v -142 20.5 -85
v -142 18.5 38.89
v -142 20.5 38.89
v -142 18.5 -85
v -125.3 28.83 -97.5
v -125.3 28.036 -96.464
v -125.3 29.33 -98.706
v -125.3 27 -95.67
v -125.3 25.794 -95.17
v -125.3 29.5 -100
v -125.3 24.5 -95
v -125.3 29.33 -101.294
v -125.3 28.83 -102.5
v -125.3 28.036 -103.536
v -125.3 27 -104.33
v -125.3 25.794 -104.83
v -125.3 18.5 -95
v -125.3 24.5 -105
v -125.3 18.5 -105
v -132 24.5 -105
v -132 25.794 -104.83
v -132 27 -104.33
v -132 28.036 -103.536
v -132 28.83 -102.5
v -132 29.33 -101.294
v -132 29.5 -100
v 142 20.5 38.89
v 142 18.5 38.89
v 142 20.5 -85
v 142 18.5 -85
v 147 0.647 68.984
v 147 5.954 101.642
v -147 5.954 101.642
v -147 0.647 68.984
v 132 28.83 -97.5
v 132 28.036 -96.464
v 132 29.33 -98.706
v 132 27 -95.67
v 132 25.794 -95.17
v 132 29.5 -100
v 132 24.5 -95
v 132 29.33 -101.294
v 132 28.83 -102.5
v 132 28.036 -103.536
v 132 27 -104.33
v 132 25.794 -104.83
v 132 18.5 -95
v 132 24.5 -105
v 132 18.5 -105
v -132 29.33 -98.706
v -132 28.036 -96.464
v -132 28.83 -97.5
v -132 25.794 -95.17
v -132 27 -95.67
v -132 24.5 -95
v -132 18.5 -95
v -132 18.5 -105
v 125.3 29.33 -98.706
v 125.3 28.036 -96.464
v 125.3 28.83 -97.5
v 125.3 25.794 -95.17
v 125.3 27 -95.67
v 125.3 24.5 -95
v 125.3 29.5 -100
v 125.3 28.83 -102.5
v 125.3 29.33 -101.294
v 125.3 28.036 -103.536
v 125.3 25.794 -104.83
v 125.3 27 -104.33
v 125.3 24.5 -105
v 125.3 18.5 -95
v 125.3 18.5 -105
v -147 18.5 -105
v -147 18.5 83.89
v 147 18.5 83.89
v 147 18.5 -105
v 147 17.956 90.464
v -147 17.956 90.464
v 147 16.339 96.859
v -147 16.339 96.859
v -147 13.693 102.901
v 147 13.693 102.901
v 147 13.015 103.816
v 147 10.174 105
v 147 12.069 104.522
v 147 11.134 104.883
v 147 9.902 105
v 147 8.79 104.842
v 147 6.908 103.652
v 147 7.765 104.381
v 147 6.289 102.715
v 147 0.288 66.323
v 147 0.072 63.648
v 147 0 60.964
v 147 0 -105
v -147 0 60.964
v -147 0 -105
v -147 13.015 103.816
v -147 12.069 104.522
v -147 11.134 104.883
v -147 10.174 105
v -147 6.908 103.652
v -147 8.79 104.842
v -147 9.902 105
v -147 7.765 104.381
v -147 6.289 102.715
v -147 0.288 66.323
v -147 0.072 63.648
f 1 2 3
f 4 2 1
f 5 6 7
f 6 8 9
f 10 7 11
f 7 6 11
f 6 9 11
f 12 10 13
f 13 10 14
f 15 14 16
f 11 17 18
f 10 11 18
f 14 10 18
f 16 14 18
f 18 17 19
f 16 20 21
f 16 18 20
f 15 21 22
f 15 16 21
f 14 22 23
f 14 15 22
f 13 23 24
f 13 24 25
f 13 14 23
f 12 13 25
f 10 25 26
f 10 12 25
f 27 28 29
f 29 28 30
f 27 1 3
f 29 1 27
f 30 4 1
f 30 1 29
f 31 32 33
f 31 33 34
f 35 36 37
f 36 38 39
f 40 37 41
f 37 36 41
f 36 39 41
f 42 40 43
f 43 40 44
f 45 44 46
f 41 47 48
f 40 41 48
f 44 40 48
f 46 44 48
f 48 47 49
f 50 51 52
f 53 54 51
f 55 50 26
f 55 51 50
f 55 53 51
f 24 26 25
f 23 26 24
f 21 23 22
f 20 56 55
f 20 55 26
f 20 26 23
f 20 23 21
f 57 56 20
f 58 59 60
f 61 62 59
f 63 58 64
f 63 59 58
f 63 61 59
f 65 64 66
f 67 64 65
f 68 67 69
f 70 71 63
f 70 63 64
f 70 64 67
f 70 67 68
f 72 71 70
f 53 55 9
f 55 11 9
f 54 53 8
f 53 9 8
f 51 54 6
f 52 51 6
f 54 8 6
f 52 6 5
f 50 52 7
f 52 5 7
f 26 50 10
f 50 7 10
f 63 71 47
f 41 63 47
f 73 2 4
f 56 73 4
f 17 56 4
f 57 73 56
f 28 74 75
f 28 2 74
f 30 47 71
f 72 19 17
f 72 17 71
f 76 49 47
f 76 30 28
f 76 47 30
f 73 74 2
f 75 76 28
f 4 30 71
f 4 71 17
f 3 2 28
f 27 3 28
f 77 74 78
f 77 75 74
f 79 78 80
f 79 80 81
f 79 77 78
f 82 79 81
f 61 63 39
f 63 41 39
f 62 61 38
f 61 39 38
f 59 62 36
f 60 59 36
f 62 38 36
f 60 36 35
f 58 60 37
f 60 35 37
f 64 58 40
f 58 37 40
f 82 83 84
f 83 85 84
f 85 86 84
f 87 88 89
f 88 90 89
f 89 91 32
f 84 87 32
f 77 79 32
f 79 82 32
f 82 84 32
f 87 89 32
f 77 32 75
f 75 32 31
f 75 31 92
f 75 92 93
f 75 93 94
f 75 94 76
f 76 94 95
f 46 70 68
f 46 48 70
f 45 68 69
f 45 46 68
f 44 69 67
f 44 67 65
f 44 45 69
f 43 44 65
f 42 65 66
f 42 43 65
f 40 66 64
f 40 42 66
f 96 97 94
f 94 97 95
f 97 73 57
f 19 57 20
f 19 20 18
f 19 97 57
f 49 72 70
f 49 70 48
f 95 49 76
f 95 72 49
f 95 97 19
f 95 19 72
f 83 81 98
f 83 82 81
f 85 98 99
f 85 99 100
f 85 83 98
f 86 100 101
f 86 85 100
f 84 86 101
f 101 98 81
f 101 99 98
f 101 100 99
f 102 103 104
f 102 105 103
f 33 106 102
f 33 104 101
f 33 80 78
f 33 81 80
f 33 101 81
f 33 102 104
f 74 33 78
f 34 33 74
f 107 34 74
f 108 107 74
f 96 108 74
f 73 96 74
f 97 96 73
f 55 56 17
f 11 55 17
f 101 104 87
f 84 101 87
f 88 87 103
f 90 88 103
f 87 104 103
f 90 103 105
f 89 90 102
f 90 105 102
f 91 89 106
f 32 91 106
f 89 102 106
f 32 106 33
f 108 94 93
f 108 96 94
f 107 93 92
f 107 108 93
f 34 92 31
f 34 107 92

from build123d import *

# Parameters (mm, degrees)
SKETCH1_W           = 294
SKETCH1_H           = 210
BOSS_EXTRUDE1_DEPTH = 18.5
CUT_EXTRUDE1_DEPTH  = 300
CHAMFER1_SIZE       = 6
CHAMFER1_SIZE2      = 10.392304845
FILLET1_R           = 40
FILLET2_R           = 4
FILLET3_R           = 50
SKETCH3_W           = 6.7
SKETCH3_H           = 10
BOSS_EXTRUDE2_DEPTH = 11
FILLET4_R           = 5
SKETCH4_W           = 284
SKETCH4_H           = 123.889727457
BOSS_EXTRUDE3_DEPTH = 2


with BuildPart() as part:
    # Sketch1 → Boss-Extrude1 (new body)
    with BuildSketch(Plane(origin=(0, 0, 0), x_dir=(1, 0, 0), z_dir=(0, 1, 0))):
        Rectangle(SKETCH1_W, SKETCH1_H)
    extrude(amount=BOSS_EXTRUDE1_DEPTH)

    # Sketch2 → Cut-Extrude1 (cut)
    with BuildSketch(Plane(origin=(147, 0, 0), x_dir=(0, 0, -1), z_dir=(1, 0, 0))):
        Polygon((-105, 6.5), (-65, 0), (-105, 0), align=None)
    extrude(amount=-CUT_EXTRUDE1_DEPTH, mode=Mode.SUBTRACT)

    # Chamfer1
    chamfer1_edges = [part.edges().sort_by_distance(p)[0] for p in [
        (0, 18.5, 105),
    ]]
    chamfer1_side = [part.faces().sort_by_distance(p)[0] for p in [
        (0, 12.5, 105),
    ]]
    chamfer(chamfer1_edges, length=CHAMFER1_SIZE, length2=CHAMFER1_SIZE2, reference=chamfer1_side[0])

    # Fillet1
    fillet1_edges = [part.edges().sort_by_distance(p)[0] for p in [
        (0, 18.5, 94.607695155),
    ]]
    fillet(fillet1_edges, radius=FILLET1_R)

    # Fillet2
    fillet2_edges = [part.edges().sort_by_distance(p)[0] for p in [
        (0, 6.5, 105),
        (0, 12.5, 105),
    ]]
    fillet(fillet2_edges, radius=FILLET2_R)

    # Fillet3
    fillet3_edges = [part.edges().sort_by_distance(p)[0] for p in [
        (0, 0, 65),
    ]]
    fillet(fillet3_edges, radius=FILLET3_R)

    # Sketch3 → Boss-Extrude2 (add)
    with BuildSketch(Plane(origin=(0, 18.5, 0), x_dir=(1, 0, 0), z_dir=(0, 1, 0))):
        with Locations((128.65, 100)):
            Rectangle(SKETCH3_W, SKETCH3_H)
        with Locations((-128.65, 100)):
            Rectangle(SKETCH3_W, SKETCH3_H)
    extrude(amount=BOSS_EXTRUDE2_DEPTH)

    # Fillet4
    fillet4_edges = [part.edges().sort_by_distance(p)[0] for p in [
        (128.65, 29.5, -105),
        (128.65, 29.5, -95),
        (-128.65, 29.5, -105),
        (-128.65, 29.5, -95),
    ]]
    fillet(fillet4_edges, radius=FILLET4_R - 0.0001)  # a hair under: the kernel refuses the full size

    # Sketch4 → Boss-Extrude3 (add)
    with BuildSketch(Plane(origin=(0, 18.5, 0), x_dir=(1, 0, 0), z_dir=(0, 1, 0))):
        with Locations((0, 23.055136272)):
            Rectangle(SKETCH4_W, SKETCH4_H)
    extrude(amount=BOSS_EXTRUDE3_DEPTH)


solid = part.part
